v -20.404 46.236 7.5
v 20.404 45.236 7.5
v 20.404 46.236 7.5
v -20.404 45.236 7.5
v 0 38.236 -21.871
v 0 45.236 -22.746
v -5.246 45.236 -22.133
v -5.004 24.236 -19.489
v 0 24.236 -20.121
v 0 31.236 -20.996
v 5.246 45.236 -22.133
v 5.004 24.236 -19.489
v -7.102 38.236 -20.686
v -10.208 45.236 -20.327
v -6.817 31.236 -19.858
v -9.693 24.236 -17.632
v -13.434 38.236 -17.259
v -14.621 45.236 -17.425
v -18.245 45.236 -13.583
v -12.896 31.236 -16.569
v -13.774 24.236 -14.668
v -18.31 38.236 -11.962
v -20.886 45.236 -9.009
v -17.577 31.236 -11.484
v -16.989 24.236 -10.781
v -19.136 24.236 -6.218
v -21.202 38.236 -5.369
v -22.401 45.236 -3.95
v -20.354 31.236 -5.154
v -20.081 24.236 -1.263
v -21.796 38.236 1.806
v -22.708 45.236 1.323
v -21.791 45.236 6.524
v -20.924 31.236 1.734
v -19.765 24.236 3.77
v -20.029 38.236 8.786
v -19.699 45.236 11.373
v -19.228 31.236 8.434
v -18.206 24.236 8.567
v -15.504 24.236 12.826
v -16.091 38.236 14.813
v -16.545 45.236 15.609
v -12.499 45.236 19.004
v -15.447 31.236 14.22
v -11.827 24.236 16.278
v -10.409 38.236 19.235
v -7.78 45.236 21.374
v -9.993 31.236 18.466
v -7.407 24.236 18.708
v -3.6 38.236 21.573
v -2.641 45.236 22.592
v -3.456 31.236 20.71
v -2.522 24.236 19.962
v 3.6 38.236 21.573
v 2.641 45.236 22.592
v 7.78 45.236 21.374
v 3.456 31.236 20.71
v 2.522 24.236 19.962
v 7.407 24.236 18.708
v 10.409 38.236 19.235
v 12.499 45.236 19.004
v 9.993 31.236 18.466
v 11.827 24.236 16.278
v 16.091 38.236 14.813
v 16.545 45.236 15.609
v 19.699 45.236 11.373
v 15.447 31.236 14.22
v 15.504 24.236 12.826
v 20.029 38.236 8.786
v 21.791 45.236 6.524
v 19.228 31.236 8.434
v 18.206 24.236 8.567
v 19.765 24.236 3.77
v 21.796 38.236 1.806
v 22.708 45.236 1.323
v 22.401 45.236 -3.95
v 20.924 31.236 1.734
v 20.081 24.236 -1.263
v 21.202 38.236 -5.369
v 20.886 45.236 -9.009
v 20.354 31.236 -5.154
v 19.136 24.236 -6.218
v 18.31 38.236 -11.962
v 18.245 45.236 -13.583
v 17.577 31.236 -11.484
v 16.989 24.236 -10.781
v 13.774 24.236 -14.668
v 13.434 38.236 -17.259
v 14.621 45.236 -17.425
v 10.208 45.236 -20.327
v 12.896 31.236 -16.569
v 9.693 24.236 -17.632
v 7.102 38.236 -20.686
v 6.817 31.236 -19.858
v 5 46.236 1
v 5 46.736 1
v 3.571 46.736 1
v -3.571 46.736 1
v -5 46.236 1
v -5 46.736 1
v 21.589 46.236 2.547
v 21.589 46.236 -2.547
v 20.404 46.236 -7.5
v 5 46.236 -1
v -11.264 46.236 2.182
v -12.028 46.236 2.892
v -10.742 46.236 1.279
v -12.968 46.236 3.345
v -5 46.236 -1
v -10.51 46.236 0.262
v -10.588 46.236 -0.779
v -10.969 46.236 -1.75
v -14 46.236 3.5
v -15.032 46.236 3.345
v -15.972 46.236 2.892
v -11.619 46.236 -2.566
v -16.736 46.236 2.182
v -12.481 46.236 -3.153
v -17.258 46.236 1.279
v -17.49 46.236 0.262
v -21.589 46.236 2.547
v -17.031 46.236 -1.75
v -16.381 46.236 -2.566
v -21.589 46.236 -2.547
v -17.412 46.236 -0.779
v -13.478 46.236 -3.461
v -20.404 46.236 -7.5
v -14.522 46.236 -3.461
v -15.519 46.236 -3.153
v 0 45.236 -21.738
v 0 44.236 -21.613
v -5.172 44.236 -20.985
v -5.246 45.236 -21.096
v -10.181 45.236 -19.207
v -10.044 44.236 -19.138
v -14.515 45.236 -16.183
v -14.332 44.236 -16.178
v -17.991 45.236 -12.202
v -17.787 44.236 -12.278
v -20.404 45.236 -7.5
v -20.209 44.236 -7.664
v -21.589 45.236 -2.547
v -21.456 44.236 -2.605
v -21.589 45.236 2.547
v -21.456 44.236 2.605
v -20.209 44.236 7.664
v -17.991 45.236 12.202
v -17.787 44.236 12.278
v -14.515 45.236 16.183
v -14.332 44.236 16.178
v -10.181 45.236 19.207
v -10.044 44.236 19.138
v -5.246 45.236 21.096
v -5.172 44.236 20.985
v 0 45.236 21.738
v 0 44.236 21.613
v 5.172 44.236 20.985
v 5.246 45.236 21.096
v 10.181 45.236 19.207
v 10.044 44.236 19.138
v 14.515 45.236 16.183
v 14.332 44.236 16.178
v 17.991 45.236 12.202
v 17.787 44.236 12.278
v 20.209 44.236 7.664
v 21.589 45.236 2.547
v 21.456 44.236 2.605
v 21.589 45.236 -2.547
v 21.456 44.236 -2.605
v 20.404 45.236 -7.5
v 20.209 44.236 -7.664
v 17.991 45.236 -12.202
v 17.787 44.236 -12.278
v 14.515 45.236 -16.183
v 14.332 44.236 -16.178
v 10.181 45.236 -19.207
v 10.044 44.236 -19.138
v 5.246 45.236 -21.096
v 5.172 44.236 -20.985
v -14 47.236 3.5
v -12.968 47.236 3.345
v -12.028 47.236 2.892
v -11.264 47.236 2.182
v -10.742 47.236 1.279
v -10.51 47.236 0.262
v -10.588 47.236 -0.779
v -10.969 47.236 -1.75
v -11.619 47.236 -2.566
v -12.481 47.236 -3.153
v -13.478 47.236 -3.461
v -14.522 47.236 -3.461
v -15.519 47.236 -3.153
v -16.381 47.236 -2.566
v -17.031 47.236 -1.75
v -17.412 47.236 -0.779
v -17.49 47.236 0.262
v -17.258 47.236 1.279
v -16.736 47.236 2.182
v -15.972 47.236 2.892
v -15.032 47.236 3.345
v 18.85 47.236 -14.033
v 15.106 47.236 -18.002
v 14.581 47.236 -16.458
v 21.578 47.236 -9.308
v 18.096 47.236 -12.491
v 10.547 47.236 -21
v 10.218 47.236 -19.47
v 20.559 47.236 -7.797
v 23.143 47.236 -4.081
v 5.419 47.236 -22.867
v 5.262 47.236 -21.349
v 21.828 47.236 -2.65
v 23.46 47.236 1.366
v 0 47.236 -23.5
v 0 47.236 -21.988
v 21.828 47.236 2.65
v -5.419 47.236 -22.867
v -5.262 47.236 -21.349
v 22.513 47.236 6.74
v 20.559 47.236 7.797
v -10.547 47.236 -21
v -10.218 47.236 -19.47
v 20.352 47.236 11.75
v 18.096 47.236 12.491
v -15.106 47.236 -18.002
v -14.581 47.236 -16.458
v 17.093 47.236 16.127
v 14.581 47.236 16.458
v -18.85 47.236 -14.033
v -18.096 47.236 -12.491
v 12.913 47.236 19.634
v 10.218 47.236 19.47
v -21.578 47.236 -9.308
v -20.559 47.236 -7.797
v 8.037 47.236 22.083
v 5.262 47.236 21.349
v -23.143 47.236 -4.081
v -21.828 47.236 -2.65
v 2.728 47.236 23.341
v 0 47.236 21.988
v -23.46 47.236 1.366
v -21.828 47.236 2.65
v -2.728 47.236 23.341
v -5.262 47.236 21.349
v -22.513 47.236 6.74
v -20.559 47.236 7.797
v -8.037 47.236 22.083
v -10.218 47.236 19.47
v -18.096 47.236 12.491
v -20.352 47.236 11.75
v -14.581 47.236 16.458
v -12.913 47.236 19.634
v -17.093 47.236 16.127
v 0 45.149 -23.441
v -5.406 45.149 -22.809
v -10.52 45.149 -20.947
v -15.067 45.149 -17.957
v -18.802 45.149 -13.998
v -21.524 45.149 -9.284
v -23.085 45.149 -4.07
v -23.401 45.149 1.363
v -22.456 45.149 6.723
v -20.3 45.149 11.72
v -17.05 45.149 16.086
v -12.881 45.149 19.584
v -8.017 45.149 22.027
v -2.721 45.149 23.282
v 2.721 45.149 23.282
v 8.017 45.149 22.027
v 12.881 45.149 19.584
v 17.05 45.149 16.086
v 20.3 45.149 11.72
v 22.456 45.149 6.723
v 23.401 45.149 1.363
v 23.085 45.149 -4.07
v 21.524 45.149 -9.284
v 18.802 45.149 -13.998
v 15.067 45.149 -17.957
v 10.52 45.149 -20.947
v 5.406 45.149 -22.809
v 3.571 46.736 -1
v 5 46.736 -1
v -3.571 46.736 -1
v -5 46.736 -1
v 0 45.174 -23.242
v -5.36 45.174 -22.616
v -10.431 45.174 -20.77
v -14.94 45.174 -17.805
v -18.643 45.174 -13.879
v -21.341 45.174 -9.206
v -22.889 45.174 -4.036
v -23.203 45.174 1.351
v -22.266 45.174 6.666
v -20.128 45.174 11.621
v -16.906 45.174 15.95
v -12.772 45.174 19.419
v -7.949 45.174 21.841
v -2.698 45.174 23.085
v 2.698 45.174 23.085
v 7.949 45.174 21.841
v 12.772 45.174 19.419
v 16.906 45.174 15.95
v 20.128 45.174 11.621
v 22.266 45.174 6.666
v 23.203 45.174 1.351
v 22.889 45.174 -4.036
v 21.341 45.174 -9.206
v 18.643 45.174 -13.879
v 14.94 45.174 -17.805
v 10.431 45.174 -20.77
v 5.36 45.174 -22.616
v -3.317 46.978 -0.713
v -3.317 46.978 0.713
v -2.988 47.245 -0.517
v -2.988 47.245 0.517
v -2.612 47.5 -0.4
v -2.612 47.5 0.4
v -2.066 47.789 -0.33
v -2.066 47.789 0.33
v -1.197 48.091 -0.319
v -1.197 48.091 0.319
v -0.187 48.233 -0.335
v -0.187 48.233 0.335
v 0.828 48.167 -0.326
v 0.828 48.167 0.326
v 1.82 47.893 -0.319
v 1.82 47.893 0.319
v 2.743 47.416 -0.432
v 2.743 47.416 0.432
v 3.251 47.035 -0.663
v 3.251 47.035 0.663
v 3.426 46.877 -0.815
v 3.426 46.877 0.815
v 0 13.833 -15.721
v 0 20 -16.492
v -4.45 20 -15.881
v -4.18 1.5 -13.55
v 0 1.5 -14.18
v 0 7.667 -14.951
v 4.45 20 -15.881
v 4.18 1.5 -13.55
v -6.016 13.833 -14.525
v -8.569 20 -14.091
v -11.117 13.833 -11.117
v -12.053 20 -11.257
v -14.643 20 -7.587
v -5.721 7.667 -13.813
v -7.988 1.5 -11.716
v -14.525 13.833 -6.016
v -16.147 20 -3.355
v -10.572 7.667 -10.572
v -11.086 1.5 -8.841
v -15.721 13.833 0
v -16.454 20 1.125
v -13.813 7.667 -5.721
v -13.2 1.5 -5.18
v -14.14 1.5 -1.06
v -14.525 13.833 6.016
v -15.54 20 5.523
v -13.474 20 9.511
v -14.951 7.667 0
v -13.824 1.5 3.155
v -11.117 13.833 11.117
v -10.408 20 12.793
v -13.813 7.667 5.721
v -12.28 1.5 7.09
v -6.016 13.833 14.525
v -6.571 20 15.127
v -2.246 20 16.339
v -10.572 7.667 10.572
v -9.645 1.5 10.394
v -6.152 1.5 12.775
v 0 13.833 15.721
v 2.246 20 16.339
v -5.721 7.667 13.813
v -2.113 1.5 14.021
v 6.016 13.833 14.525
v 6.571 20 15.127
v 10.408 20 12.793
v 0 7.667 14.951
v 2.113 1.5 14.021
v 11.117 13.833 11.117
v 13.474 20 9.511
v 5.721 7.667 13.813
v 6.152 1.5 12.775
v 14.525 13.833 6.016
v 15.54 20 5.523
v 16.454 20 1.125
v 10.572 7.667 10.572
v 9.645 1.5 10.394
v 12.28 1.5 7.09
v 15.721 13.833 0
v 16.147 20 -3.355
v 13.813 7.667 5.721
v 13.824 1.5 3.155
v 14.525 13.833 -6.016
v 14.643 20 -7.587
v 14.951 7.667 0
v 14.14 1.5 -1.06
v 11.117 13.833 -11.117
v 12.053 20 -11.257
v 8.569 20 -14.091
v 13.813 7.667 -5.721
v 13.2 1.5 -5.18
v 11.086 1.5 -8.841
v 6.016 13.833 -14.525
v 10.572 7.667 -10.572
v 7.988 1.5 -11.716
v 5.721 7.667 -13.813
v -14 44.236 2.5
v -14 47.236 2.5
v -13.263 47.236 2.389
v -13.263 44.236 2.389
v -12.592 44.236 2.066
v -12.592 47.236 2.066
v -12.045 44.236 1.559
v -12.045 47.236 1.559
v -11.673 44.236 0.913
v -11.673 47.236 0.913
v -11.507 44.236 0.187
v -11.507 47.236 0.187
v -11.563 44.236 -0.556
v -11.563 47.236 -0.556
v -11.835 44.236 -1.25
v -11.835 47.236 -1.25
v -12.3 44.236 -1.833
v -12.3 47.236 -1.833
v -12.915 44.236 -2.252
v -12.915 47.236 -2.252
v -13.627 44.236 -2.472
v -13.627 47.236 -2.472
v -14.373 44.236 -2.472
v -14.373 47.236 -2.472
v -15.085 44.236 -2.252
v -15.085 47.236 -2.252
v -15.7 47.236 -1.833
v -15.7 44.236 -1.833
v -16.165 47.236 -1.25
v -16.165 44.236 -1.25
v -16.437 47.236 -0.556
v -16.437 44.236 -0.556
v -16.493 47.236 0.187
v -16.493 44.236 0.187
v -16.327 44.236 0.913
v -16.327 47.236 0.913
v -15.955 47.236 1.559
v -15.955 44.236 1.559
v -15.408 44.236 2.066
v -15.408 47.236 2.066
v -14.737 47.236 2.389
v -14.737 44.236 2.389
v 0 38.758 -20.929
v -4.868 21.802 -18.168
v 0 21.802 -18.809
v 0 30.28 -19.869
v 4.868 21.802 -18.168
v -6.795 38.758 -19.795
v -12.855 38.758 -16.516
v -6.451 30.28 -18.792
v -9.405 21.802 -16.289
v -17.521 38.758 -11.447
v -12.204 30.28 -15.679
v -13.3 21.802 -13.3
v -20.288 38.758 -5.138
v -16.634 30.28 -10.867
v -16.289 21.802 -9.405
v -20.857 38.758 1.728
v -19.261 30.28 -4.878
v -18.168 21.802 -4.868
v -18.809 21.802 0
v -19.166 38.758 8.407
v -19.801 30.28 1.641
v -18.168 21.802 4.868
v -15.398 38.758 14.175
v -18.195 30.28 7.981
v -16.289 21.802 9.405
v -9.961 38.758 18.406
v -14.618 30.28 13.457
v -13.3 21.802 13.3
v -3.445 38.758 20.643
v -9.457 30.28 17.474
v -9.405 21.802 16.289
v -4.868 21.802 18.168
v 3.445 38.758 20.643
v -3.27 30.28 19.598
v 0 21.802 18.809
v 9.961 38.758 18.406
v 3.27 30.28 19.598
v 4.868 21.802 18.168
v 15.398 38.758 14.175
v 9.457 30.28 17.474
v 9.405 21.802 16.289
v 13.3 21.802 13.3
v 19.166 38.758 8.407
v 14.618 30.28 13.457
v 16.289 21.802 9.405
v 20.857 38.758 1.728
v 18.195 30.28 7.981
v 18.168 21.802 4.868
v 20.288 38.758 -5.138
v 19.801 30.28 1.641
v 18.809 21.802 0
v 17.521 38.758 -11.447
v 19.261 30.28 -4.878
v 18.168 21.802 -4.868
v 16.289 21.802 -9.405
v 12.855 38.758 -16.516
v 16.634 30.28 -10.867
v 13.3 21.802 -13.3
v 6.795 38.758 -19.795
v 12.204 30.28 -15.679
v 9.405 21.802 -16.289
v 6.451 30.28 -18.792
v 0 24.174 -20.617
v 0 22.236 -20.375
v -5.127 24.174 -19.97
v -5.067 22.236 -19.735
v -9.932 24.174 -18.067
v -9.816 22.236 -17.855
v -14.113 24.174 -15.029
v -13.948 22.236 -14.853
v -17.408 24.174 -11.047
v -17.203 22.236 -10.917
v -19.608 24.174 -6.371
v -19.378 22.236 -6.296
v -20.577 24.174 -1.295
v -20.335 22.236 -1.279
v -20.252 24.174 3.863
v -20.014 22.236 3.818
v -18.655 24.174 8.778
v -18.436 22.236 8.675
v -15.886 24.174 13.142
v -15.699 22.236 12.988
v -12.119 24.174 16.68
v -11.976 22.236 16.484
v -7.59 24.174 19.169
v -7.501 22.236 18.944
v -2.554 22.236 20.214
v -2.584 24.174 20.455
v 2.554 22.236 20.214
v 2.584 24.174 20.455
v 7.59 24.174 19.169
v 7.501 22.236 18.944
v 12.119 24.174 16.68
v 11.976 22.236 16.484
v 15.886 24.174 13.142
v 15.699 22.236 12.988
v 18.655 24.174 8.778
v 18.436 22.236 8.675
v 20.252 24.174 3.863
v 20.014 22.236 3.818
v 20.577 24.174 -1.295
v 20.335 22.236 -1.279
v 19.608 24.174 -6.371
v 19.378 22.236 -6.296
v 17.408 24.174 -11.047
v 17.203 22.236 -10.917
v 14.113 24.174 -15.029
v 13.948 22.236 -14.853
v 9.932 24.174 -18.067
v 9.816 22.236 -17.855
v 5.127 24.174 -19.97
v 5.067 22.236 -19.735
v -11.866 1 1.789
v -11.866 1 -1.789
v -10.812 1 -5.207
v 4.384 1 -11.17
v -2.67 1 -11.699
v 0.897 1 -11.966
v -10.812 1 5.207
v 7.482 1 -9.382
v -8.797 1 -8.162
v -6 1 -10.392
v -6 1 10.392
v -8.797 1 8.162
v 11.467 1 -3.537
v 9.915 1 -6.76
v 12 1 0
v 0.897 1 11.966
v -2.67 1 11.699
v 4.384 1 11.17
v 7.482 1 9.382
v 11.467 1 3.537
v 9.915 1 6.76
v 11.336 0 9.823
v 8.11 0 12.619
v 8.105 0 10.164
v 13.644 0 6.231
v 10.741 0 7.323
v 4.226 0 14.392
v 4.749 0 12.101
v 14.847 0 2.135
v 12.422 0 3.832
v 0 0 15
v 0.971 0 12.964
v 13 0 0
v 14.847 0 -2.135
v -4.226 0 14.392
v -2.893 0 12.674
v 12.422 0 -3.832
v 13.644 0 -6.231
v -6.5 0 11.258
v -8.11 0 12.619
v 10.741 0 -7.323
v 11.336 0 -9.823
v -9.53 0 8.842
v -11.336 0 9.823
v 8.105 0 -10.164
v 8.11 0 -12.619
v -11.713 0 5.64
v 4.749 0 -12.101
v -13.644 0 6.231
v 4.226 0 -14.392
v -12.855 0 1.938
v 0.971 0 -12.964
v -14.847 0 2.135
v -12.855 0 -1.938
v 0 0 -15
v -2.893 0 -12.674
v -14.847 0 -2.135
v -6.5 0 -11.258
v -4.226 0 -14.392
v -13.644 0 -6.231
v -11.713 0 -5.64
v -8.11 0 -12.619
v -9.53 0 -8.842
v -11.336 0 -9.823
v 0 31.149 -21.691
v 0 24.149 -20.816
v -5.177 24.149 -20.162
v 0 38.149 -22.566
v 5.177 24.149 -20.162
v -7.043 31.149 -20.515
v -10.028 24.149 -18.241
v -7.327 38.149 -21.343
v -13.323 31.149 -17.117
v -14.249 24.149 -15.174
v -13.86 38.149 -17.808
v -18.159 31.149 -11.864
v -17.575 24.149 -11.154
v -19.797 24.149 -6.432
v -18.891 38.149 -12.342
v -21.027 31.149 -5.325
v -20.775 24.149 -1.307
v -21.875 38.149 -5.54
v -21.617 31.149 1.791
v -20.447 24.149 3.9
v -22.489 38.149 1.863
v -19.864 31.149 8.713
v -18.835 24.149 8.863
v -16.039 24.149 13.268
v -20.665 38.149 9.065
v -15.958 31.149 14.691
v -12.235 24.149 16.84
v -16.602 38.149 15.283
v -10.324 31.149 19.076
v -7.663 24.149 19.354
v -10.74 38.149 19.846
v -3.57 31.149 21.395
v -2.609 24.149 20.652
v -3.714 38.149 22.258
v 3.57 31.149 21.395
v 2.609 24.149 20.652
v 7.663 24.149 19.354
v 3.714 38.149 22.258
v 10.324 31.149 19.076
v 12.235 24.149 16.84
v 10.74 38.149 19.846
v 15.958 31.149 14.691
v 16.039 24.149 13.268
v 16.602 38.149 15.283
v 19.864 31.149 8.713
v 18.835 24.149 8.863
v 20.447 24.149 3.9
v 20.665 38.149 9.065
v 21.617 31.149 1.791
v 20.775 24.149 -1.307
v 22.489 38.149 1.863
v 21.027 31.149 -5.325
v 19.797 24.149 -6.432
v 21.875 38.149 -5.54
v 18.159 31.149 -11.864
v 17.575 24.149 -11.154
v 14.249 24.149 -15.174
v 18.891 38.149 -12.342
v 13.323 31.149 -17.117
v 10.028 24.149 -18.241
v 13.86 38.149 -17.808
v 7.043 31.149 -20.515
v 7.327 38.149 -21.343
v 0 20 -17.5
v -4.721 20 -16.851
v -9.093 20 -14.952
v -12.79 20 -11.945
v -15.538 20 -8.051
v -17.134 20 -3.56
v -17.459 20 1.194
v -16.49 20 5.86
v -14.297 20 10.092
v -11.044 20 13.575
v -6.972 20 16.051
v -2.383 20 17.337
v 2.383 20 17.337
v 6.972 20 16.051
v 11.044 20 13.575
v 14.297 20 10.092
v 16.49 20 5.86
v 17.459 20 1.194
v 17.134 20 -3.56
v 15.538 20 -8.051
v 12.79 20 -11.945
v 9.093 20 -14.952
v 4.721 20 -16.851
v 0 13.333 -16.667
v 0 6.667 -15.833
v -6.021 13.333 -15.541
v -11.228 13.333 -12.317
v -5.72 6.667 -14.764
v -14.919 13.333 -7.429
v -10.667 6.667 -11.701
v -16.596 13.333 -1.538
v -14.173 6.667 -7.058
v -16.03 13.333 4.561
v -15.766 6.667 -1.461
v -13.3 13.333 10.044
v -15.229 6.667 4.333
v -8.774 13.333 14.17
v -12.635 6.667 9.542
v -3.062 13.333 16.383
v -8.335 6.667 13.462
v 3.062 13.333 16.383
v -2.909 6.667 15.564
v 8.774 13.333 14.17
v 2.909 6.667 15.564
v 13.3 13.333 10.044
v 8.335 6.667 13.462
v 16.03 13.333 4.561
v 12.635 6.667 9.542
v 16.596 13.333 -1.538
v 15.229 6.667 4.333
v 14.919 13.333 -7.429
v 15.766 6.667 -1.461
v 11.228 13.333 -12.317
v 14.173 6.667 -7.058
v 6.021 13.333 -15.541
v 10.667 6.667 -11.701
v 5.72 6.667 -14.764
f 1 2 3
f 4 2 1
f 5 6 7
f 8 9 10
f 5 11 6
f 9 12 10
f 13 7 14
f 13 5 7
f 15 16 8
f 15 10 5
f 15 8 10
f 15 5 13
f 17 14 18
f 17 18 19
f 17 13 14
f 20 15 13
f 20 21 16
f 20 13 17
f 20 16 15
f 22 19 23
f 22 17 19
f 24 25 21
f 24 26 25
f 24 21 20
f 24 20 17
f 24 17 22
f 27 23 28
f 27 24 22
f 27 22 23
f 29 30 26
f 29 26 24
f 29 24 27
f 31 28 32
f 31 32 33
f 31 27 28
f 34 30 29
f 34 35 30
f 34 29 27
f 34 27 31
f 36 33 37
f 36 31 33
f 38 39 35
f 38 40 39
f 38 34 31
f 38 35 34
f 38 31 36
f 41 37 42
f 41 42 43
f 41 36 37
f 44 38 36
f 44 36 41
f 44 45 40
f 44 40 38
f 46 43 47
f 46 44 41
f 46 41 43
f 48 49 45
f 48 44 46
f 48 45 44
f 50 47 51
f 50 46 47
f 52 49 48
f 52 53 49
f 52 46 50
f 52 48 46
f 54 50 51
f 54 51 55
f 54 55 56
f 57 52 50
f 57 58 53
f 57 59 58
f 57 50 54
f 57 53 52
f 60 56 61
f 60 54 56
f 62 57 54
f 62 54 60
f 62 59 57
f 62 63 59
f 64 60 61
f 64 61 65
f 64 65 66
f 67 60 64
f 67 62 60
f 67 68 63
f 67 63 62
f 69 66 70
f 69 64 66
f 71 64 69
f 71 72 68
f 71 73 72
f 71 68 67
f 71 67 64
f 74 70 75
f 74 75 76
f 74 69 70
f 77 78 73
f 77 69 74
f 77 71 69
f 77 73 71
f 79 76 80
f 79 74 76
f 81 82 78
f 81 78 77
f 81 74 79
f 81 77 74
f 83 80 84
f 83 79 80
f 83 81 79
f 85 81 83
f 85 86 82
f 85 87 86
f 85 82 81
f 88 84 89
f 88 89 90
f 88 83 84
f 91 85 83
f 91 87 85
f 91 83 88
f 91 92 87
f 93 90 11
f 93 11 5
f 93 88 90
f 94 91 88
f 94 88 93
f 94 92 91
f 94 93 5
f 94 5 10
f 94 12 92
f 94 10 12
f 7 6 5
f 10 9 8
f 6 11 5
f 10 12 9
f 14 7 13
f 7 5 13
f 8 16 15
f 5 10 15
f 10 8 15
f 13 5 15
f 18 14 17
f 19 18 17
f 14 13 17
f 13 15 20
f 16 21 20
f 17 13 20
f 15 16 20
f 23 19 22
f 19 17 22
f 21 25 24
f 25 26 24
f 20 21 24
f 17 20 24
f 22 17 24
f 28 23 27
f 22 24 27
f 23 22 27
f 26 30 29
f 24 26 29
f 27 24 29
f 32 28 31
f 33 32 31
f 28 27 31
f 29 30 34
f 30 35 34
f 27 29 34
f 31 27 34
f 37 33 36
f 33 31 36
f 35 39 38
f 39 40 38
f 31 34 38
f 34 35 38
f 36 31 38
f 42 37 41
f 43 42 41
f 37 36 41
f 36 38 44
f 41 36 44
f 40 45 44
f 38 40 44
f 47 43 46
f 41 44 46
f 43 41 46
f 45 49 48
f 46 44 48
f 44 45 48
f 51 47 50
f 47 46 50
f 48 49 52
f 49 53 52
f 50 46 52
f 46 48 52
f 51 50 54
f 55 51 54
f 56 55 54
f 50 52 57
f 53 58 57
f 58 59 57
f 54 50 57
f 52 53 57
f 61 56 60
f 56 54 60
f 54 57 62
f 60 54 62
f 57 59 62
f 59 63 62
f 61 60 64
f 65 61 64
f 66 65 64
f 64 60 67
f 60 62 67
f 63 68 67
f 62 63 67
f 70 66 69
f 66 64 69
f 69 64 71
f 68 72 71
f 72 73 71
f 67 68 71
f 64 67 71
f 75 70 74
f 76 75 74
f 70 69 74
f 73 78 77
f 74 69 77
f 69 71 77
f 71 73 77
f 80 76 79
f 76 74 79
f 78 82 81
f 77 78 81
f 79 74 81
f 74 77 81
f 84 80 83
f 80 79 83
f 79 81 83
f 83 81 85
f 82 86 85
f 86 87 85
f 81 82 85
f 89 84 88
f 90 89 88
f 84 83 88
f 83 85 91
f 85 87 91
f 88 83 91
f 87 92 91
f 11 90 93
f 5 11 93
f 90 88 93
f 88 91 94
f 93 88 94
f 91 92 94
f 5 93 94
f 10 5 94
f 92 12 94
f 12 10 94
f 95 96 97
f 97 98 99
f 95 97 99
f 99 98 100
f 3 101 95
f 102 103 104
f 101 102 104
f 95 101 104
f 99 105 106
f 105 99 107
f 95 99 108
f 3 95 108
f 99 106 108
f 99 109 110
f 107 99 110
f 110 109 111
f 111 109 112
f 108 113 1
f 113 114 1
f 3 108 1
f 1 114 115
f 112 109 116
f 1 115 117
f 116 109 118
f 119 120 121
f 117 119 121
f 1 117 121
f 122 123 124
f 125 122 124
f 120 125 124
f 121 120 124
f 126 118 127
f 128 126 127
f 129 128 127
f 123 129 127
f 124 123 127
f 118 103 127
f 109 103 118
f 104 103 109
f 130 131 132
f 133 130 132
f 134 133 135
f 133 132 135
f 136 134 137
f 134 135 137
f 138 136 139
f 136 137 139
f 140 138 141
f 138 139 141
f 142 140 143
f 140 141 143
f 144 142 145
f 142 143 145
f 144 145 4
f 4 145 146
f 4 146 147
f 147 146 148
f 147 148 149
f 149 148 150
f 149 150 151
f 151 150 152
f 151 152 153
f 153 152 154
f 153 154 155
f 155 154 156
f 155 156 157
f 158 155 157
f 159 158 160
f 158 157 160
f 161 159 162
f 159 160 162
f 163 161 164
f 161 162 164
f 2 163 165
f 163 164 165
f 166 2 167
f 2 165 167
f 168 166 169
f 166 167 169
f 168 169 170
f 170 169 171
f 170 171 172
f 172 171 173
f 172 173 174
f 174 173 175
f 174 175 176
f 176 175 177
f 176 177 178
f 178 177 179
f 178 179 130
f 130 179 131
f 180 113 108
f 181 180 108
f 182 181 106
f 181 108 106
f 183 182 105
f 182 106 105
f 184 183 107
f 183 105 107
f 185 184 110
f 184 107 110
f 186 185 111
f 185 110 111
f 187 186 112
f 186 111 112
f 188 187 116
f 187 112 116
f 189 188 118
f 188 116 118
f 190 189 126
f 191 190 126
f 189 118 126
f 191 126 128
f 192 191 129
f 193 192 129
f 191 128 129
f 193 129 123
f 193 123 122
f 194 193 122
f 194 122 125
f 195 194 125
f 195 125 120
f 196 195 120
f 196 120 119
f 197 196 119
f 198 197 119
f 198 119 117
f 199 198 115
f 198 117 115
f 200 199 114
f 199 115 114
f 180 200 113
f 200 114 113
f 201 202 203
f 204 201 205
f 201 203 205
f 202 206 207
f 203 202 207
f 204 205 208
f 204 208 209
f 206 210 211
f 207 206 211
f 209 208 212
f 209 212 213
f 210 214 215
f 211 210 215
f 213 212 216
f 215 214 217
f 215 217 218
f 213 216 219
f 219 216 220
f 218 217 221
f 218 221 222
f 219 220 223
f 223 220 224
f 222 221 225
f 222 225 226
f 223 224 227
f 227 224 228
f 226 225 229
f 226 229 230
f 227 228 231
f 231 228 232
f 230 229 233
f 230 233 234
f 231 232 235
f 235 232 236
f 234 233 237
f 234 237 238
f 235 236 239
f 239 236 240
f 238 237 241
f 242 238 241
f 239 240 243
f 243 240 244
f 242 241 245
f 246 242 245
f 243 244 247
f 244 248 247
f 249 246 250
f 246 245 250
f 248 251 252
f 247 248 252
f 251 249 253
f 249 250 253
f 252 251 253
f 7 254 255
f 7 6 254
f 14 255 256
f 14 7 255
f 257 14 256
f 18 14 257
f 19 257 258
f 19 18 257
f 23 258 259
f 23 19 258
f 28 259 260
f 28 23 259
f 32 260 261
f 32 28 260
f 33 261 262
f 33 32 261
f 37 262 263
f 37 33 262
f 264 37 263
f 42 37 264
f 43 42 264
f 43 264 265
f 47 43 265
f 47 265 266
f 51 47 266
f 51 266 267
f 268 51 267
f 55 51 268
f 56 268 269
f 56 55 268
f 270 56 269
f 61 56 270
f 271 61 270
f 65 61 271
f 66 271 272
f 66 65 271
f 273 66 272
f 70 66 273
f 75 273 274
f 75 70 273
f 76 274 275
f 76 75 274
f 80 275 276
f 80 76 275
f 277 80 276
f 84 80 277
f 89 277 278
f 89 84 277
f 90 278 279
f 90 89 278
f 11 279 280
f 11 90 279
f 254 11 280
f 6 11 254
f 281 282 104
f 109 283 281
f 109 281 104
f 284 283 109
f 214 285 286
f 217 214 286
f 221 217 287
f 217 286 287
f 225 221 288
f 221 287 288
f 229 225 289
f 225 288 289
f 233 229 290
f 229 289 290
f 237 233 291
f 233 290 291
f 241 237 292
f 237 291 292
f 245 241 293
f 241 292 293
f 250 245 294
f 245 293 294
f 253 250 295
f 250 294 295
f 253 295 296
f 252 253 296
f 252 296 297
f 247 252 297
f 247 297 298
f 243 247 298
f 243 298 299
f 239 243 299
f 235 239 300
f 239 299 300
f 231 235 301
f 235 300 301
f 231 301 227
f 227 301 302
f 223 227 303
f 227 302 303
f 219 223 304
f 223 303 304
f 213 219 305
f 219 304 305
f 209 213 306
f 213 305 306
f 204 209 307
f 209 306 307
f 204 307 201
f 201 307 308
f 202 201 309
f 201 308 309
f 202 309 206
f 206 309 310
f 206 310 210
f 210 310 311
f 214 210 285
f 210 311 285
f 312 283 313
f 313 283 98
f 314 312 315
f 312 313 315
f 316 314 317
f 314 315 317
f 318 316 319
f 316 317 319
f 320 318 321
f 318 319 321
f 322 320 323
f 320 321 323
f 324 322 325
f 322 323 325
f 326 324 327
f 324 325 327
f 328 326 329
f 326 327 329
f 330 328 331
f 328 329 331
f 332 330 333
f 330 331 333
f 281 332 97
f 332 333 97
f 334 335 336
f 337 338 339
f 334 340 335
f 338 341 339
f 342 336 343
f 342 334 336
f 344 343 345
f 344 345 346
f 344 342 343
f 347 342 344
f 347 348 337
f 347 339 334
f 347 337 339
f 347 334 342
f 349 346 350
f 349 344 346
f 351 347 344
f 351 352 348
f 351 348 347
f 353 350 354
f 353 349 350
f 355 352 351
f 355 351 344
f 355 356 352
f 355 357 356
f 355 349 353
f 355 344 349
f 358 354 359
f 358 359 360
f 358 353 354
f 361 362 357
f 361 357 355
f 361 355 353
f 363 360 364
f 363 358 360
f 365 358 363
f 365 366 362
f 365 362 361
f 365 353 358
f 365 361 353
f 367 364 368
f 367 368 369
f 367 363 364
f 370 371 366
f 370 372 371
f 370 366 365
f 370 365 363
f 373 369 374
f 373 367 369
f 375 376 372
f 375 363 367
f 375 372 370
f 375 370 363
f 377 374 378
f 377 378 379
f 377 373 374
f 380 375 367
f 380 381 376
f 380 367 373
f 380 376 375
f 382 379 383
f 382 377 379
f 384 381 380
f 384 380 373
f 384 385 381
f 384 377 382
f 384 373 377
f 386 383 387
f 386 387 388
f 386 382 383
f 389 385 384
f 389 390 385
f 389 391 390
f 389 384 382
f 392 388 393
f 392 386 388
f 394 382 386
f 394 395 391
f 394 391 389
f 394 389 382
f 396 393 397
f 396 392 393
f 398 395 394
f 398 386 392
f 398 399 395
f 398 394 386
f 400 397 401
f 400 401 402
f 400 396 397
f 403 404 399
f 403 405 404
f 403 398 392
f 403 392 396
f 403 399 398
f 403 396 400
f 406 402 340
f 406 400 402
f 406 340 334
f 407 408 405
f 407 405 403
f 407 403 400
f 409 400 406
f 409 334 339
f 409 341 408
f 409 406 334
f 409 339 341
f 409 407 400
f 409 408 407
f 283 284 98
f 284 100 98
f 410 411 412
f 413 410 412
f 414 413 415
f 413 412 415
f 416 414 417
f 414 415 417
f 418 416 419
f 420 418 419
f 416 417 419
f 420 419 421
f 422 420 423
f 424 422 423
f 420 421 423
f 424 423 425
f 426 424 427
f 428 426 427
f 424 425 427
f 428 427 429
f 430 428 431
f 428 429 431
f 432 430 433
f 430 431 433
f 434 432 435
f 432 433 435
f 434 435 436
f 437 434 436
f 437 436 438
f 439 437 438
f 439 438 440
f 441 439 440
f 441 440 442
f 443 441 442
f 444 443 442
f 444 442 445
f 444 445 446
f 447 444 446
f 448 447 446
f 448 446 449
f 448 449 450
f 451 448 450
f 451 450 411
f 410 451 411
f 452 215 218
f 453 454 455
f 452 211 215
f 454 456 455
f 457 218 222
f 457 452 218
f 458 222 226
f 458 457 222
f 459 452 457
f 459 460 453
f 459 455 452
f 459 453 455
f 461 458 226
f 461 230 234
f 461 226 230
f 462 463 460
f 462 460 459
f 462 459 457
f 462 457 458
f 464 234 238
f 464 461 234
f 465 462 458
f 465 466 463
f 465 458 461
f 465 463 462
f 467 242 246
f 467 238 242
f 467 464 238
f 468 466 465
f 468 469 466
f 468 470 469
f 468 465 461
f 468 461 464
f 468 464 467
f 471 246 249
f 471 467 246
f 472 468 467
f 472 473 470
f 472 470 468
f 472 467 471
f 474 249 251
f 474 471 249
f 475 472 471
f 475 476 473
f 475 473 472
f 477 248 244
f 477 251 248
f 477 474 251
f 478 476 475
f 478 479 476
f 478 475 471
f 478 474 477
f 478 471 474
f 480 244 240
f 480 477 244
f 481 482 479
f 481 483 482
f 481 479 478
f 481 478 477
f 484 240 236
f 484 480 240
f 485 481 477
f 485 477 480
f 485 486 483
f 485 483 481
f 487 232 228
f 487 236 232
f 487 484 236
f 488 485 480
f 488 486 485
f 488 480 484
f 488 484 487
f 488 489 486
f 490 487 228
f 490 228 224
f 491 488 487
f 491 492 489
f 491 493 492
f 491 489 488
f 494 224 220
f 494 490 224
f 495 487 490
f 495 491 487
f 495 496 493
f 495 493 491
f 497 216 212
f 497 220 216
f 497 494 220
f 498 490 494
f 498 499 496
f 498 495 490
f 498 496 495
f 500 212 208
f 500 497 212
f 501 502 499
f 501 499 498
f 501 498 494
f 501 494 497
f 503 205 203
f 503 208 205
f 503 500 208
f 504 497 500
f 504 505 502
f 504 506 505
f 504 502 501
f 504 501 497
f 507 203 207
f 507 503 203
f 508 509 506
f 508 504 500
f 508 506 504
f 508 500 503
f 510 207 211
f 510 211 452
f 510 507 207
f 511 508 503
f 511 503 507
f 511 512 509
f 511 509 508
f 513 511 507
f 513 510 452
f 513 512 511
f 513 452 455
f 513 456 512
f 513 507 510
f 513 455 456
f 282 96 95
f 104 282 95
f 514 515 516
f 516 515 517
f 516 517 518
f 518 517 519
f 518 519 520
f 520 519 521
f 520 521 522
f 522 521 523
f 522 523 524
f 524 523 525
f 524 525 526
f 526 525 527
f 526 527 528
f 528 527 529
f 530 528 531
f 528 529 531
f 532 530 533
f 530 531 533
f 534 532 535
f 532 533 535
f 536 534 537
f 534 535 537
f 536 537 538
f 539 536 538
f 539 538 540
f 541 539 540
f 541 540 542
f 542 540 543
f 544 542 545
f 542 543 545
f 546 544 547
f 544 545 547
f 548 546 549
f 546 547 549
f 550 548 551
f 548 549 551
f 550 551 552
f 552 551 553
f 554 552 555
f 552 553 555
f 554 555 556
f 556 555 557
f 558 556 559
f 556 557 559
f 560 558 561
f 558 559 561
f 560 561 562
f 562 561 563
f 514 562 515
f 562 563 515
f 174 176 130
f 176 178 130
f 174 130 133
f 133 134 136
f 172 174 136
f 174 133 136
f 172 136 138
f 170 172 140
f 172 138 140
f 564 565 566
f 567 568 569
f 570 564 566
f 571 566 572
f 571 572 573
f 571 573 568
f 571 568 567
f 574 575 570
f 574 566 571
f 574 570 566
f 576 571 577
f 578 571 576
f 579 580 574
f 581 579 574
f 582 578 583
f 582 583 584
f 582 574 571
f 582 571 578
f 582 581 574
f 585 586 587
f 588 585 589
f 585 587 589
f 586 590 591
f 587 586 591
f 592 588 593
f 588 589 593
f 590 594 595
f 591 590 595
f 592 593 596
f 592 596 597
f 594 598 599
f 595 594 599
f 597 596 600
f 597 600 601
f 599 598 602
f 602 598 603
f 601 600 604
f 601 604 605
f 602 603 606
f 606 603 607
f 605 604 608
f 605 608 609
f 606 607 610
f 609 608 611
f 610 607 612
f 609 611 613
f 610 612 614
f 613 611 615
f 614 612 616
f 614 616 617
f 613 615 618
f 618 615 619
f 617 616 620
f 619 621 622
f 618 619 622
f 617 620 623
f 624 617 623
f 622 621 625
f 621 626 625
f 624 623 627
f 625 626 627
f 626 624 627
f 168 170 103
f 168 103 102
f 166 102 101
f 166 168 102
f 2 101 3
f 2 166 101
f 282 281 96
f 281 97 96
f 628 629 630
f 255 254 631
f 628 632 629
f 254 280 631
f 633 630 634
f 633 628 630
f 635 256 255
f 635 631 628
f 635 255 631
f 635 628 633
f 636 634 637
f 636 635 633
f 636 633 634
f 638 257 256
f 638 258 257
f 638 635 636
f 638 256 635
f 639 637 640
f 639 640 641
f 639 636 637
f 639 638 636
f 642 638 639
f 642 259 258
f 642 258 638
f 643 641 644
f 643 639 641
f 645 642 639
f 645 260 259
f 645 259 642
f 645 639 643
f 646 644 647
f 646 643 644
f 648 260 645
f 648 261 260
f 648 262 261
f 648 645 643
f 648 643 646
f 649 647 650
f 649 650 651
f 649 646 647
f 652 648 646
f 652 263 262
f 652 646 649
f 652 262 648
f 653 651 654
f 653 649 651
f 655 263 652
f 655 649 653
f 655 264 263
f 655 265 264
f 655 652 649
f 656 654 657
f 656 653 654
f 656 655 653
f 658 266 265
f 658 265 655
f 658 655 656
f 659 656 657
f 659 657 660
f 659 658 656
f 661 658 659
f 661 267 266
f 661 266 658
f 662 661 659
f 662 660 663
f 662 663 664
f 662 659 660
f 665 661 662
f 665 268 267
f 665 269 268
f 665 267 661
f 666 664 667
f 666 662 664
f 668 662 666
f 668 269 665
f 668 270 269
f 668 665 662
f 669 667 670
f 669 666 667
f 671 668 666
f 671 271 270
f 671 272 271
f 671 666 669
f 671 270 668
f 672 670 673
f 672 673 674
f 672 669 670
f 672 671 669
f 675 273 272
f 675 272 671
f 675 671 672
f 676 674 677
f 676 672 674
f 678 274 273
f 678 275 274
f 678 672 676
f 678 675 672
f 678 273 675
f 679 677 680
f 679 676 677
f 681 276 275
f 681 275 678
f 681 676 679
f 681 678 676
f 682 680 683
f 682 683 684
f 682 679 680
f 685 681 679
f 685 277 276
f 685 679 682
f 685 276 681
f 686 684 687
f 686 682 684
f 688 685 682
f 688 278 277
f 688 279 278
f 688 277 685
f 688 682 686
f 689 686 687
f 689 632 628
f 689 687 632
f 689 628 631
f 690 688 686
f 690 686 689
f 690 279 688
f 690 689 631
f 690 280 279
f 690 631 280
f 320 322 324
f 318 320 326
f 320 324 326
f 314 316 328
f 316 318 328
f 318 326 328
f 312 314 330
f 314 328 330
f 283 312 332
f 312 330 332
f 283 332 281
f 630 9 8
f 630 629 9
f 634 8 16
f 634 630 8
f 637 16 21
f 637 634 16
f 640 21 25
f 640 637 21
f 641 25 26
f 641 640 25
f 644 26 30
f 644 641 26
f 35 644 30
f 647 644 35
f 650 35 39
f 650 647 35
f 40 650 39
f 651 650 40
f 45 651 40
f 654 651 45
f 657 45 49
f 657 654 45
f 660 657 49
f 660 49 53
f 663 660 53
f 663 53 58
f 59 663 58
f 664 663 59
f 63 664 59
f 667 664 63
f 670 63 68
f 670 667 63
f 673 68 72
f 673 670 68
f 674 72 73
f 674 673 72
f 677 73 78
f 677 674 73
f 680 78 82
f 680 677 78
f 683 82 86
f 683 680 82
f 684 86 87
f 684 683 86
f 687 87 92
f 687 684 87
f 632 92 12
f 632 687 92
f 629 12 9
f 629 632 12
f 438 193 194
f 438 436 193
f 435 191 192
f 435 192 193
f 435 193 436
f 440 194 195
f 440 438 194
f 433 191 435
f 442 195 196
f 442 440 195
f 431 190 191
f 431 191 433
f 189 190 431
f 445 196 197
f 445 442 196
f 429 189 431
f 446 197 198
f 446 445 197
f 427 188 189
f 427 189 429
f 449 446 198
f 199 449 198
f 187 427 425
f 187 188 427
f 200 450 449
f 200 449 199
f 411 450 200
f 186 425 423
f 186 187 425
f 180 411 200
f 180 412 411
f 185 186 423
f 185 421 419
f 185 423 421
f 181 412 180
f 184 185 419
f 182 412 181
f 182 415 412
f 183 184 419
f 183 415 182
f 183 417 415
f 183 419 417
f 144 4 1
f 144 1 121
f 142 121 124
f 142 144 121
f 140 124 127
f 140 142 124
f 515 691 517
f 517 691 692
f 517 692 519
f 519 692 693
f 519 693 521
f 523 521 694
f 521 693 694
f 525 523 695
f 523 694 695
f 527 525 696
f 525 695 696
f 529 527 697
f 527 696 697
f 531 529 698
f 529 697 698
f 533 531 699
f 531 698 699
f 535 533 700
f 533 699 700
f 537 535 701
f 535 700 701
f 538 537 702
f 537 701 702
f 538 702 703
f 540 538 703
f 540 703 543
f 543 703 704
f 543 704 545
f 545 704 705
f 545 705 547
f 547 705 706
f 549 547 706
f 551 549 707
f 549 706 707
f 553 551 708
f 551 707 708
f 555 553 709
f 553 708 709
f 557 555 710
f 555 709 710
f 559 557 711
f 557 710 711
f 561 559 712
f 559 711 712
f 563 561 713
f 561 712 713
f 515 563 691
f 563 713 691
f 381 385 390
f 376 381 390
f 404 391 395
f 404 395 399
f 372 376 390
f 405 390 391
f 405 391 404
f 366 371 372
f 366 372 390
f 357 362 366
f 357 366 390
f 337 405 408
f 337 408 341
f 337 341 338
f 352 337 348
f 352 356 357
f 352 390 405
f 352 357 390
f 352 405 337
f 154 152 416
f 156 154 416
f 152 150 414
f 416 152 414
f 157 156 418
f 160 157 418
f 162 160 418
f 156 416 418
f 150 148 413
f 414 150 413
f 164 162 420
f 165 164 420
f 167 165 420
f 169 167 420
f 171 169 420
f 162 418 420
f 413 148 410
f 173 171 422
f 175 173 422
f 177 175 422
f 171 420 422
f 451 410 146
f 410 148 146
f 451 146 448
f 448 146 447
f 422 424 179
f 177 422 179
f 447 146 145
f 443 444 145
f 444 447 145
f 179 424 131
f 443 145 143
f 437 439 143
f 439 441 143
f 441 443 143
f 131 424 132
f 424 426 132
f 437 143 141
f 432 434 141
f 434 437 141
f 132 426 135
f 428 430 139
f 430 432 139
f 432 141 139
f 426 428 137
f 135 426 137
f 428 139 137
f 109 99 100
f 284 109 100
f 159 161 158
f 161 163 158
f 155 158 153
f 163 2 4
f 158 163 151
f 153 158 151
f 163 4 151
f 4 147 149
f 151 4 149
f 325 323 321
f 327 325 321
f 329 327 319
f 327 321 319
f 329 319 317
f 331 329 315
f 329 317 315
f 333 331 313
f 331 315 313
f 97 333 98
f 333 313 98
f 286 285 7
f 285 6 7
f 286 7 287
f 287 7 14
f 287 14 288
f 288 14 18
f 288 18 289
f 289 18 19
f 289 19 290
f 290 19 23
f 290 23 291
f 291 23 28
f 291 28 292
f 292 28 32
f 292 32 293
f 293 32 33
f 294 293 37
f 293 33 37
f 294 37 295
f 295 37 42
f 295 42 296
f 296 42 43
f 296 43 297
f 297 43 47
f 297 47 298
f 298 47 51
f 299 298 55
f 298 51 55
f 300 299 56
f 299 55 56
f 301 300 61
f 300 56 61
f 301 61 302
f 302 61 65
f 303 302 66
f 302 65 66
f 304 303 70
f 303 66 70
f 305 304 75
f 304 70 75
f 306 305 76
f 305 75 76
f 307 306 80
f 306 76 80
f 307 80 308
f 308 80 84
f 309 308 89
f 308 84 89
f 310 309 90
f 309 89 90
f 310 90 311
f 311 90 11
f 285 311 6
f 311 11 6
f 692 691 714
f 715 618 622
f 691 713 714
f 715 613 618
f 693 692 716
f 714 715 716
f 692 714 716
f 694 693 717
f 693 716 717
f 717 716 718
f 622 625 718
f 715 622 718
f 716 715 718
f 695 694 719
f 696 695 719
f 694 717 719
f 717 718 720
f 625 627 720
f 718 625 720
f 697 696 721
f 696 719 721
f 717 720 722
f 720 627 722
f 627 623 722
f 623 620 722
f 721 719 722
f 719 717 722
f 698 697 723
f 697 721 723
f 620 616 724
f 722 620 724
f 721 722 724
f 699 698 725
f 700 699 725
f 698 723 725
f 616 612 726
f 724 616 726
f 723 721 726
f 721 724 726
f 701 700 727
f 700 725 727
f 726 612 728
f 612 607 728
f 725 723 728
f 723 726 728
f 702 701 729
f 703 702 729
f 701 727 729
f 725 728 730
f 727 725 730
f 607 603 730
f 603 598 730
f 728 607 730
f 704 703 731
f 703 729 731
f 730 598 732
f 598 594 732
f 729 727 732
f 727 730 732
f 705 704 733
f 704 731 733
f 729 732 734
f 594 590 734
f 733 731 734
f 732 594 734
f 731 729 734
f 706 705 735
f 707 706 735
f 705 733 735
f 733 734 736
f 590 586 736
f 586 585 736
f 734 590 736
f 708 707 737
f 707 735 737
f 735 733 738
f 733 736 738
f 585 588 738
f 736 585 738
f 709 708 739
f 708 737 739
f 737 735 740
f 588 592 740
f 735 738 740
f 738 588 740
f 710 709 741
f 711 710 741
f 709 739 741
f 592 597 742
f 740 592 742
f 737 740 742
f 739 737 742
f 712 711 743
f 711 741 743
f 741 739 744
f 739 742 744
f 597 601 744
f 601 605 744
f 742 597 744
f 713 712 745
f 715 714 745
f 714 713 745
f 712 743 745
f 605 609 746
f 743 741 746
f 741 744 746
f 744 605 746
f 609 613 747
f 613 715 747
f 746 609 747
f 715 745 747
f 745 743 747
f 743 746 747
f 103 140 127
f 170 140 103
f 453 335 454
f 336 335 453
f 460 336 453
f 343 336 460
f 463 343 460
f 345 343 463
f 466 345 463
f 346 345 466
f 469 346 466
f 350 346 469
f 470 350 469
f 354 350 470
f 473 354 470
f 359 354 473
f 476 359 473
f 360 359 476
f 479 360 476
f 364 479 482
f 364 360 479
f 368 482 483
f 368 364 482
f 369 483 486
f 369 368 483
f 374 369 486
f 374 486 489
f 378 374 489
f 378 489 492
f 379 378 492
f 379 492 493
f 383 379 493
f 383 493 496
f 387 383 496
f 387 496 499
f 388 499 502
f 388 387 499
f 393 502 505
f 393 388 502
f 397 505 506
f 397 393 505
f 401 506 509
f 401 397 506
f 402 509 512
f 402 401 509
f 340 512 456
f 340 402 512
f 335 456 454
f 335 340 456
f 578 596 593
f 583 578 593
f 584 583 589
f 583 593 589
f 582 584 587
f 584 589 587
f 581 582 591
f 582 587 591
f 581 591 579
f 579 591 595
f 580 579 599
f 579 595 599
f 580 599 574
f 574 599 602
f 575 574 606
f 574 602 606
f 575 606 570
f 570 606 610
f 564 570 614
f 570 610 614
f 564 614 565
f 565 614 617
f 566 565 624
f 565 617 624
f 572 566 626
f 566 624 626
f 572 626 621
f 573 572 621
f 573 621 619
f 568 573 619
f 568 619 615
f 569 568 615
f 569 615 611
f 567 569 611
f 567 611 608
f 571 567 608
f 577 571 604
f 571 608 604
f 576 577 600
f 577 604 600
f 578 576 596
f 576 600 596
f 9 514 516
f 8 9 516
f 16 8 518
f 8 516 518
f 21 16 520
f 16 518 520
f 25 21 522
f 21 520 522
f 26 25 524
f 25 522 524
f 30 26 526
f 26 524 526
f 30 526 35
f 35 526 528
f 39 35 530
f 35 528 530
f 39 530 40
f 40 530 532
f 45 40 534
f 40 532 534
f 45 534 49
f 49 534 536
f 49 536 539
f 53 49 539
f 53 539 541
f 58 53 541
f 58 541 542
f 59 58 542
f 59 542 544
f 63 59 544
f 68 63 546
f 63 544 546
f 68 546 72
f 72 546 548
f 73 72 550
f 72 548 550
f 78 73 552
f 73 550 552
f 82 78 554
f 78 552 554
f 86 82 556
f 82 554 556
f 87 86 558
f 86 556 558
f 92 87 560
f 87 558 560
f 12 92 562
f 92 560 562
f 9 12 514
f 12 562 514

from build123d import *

# Parameters (mm, degrees)
SKETCH2_R           = 13
CUT_EXTRUDE1_DEPTH  = 1
CUT_EXTRUDE1_DRAFT  = -45
BOSS_EXTRUDE1_DEPTH = 1
SKETCH7_R           = 3.5
BOSS_EXTRUDE2_DEPTH = 1
SKETCH8_R           = 2.5
CUT_EXTRUDE2_DEPTH  = 19
BOSS_EXTRUDE3_DEPTH = 1
CUT_EXTRUDE3_DEPTH  = 7.5


with BuildPart() as part:
    # Sketch1 → Revolve1 (revolve)
    with BuildSketch(Plane.XY):
        Polygon((0, 47.236111111), (23.5, 47.236111111), (20.375, 22.236111111), (17.5, 20), (15, 0), (0, 0), align=None)
    revolve(axis=Axis((0, 0, 0), (0, 1, 0)))


with BuildPart() as cut_extrude1_tool:
    # Sketch2 → Cut-Extrude1 (with draft: the straight prism first)
    with BuildSketch(Plane.XZ):
        Circle(SKETCH2_R)
    extrude(amount=-CUT_EXTRUDE1_DEPTH)
    # Cut-Extrude1: the draft: its side faces are tilted about the plane it starts from
    cut_extrude1_sides = [cut_extrude1_tool.faces().sort_by_distance(p)[0] for p in [
        (-13, 0.5, 0),
    ]]
    draft(cut_extrude1_sides, Plane.XZ, CUT_EXTRUDE1_DRAFT)


with BuildPart() as part_1:
    add(part.part)

    # Cut-Extrude1: cut by cut_extrude1_tool
    add(cut_extrude1_tool.part, mode=Mode.SUBTRACT)

    # Sketch3 → Cut-Revolve1 (revolve, cut)
    with BuildSketch(Plane.XY):
        Polygon((-22.746108891, 45.236111111), (-20.121108891, 24.236111111), (-20.815703404, 24.149286797), (-23.440703404, 45.149286797), align=None)
    revolve(axis=Axis((0, 0, 0), (0, 1, 0)), mode=Mode.SUBTRACT)

    # Sketch4 → Cut-Revolve2 (revolve, cut)
    with BuildSketch(Plane.XY):
        Polygon((0, 51.679010238), (22.543689063, 51.679010238), (18.809061476, 21.80198954), (16.492217781, 20), (14.179717781, 1.5), (0, 1.5), align=None)
    revolve(axis=Axis((0, 0, 0), (0, 1, 0)), mode=Mode.SUBTRACT)


with BuildPart() as body_2:
    # Sketch3<2> → Revolve2 (revolve)
    with BuildSketch(Plane.XY):
        Polygon((-22.746108891, 45.236111111), (-20.121108891, 24.236111111), (-20.815703404, 24.149286797), (-23.440703404, 45.149286797), align=None)
    revolve(axis=Axis((0, 0, 0), (0, 1, 0)))


with BuildPart() as body_3:
    # Sketch5 → Revolve3 (revolve)
    with BuildSketch(Plane.XY):
        Polygon((0, 45.236111111), (21.738326672, 45.236111111), (21.613326672, 44.236111111), (0, 44.236111111), align=None)
    revolve(axis=Axis((0, 0, 0), (0, 1, 0)))

    # Sketch6 → Boss-Extrude1 (add)
    with BuildSketch(Plane(origin=(0, 45.236111111, 0), x_dir=(1, 0, 0), z_dir=(0, 1, 0))):
        with BuildLine():
            Line((20.403549851, -7.5), (-20.403549851, -7.5))
            ThreePointArc((-20.403549851, -7.5), (-21.738326672, 0), (-20.403549851, 7.5))
            Line((-20.403549851, 7.5), (20.403549851, 7.5))
            ThreePointArc((20.403549851, 7.5), (21.738326672, 0), (20.403549851, -7.5))
        make_face()
    extrude(amount=BOSS_EXTRUDE1_DEPTH)

    # Sketch7 → Boss-Extrude2 (add)
    with BuildSketch(Plane(origin=(0, 46.236111111, 0), x_dir=(1, 0, 0), z_dir=(0, 1, 0))):
        with Locations((-14, 0)):
            Circle(SKETCH7_R)
    extrude(amount=BOSS_EXTRUDE2_DEPTH)

    # Sketch8 → Cut-Extrude2 (cut)
    with BuildSketch(Plane(origin=(0, 47.236111111, 0), x_dir=(1, 0, 0), z_dir=(0, 1, 0))):
        with Locations((-14, 0)):
            Circle(SKETCH8_R)
    extrude(amount=-CUT_EXTRUDE2_DEPTH, mode=Mode.SUBTRACT)

    # Sketch9 → Boss-Extrude3 (add, symmetric)
    with BuildSketch(Plane.XY):
        with BuildLine():
            Line((-5, 46.236111111), (-5, 46.736111111))
            Line((-5, 46.736111111), (-3.570714214, 46.736111111))
            ThreePointArc((-3.570714214, 46.736111111), (0, 48.236111111), (3.570714214, 46.736111111))
            Line((3.570714214, 46.736111111), (5, 46.736111111))
            Line((5, 46.736111111), (5, 46.236111111))
            Line((5, 46.236111111), (-5, 46.236111111))
        make_face()
    extrude(amount=BOSS_EXTRUDE3_DEPTH, both=True)

    # Sketch10 → Cut-Extrude3 (cut, symmetric)
    with BuildSketch(Plane(origin=(0, 0, 0), x_dir=(0, 0, -1), z_dir=(1, 0, 0))):
        with BuildLine():
            Line((-1, 46.736111111), (-2, 49.483588531))
            ThreePointArc((-2, 49.483588531), (-0.40612221, 48.507988776), (-1, 46.736111111))
        make_face()
        with BuildLine():
            Line((1, 46.736111111), (2, 49.483588531))
            ThreePointArc((2, 49.483588531), (0.40612221, 48.507988776), (1, 46.736111111))
        make_face()
    extrude(amount=CUT_EXTRUDE3_DEPTH, both=True, mode=Mode.SUBTRACT)


solid = Compound([part_1.part, body_2.part, body_3.part])
